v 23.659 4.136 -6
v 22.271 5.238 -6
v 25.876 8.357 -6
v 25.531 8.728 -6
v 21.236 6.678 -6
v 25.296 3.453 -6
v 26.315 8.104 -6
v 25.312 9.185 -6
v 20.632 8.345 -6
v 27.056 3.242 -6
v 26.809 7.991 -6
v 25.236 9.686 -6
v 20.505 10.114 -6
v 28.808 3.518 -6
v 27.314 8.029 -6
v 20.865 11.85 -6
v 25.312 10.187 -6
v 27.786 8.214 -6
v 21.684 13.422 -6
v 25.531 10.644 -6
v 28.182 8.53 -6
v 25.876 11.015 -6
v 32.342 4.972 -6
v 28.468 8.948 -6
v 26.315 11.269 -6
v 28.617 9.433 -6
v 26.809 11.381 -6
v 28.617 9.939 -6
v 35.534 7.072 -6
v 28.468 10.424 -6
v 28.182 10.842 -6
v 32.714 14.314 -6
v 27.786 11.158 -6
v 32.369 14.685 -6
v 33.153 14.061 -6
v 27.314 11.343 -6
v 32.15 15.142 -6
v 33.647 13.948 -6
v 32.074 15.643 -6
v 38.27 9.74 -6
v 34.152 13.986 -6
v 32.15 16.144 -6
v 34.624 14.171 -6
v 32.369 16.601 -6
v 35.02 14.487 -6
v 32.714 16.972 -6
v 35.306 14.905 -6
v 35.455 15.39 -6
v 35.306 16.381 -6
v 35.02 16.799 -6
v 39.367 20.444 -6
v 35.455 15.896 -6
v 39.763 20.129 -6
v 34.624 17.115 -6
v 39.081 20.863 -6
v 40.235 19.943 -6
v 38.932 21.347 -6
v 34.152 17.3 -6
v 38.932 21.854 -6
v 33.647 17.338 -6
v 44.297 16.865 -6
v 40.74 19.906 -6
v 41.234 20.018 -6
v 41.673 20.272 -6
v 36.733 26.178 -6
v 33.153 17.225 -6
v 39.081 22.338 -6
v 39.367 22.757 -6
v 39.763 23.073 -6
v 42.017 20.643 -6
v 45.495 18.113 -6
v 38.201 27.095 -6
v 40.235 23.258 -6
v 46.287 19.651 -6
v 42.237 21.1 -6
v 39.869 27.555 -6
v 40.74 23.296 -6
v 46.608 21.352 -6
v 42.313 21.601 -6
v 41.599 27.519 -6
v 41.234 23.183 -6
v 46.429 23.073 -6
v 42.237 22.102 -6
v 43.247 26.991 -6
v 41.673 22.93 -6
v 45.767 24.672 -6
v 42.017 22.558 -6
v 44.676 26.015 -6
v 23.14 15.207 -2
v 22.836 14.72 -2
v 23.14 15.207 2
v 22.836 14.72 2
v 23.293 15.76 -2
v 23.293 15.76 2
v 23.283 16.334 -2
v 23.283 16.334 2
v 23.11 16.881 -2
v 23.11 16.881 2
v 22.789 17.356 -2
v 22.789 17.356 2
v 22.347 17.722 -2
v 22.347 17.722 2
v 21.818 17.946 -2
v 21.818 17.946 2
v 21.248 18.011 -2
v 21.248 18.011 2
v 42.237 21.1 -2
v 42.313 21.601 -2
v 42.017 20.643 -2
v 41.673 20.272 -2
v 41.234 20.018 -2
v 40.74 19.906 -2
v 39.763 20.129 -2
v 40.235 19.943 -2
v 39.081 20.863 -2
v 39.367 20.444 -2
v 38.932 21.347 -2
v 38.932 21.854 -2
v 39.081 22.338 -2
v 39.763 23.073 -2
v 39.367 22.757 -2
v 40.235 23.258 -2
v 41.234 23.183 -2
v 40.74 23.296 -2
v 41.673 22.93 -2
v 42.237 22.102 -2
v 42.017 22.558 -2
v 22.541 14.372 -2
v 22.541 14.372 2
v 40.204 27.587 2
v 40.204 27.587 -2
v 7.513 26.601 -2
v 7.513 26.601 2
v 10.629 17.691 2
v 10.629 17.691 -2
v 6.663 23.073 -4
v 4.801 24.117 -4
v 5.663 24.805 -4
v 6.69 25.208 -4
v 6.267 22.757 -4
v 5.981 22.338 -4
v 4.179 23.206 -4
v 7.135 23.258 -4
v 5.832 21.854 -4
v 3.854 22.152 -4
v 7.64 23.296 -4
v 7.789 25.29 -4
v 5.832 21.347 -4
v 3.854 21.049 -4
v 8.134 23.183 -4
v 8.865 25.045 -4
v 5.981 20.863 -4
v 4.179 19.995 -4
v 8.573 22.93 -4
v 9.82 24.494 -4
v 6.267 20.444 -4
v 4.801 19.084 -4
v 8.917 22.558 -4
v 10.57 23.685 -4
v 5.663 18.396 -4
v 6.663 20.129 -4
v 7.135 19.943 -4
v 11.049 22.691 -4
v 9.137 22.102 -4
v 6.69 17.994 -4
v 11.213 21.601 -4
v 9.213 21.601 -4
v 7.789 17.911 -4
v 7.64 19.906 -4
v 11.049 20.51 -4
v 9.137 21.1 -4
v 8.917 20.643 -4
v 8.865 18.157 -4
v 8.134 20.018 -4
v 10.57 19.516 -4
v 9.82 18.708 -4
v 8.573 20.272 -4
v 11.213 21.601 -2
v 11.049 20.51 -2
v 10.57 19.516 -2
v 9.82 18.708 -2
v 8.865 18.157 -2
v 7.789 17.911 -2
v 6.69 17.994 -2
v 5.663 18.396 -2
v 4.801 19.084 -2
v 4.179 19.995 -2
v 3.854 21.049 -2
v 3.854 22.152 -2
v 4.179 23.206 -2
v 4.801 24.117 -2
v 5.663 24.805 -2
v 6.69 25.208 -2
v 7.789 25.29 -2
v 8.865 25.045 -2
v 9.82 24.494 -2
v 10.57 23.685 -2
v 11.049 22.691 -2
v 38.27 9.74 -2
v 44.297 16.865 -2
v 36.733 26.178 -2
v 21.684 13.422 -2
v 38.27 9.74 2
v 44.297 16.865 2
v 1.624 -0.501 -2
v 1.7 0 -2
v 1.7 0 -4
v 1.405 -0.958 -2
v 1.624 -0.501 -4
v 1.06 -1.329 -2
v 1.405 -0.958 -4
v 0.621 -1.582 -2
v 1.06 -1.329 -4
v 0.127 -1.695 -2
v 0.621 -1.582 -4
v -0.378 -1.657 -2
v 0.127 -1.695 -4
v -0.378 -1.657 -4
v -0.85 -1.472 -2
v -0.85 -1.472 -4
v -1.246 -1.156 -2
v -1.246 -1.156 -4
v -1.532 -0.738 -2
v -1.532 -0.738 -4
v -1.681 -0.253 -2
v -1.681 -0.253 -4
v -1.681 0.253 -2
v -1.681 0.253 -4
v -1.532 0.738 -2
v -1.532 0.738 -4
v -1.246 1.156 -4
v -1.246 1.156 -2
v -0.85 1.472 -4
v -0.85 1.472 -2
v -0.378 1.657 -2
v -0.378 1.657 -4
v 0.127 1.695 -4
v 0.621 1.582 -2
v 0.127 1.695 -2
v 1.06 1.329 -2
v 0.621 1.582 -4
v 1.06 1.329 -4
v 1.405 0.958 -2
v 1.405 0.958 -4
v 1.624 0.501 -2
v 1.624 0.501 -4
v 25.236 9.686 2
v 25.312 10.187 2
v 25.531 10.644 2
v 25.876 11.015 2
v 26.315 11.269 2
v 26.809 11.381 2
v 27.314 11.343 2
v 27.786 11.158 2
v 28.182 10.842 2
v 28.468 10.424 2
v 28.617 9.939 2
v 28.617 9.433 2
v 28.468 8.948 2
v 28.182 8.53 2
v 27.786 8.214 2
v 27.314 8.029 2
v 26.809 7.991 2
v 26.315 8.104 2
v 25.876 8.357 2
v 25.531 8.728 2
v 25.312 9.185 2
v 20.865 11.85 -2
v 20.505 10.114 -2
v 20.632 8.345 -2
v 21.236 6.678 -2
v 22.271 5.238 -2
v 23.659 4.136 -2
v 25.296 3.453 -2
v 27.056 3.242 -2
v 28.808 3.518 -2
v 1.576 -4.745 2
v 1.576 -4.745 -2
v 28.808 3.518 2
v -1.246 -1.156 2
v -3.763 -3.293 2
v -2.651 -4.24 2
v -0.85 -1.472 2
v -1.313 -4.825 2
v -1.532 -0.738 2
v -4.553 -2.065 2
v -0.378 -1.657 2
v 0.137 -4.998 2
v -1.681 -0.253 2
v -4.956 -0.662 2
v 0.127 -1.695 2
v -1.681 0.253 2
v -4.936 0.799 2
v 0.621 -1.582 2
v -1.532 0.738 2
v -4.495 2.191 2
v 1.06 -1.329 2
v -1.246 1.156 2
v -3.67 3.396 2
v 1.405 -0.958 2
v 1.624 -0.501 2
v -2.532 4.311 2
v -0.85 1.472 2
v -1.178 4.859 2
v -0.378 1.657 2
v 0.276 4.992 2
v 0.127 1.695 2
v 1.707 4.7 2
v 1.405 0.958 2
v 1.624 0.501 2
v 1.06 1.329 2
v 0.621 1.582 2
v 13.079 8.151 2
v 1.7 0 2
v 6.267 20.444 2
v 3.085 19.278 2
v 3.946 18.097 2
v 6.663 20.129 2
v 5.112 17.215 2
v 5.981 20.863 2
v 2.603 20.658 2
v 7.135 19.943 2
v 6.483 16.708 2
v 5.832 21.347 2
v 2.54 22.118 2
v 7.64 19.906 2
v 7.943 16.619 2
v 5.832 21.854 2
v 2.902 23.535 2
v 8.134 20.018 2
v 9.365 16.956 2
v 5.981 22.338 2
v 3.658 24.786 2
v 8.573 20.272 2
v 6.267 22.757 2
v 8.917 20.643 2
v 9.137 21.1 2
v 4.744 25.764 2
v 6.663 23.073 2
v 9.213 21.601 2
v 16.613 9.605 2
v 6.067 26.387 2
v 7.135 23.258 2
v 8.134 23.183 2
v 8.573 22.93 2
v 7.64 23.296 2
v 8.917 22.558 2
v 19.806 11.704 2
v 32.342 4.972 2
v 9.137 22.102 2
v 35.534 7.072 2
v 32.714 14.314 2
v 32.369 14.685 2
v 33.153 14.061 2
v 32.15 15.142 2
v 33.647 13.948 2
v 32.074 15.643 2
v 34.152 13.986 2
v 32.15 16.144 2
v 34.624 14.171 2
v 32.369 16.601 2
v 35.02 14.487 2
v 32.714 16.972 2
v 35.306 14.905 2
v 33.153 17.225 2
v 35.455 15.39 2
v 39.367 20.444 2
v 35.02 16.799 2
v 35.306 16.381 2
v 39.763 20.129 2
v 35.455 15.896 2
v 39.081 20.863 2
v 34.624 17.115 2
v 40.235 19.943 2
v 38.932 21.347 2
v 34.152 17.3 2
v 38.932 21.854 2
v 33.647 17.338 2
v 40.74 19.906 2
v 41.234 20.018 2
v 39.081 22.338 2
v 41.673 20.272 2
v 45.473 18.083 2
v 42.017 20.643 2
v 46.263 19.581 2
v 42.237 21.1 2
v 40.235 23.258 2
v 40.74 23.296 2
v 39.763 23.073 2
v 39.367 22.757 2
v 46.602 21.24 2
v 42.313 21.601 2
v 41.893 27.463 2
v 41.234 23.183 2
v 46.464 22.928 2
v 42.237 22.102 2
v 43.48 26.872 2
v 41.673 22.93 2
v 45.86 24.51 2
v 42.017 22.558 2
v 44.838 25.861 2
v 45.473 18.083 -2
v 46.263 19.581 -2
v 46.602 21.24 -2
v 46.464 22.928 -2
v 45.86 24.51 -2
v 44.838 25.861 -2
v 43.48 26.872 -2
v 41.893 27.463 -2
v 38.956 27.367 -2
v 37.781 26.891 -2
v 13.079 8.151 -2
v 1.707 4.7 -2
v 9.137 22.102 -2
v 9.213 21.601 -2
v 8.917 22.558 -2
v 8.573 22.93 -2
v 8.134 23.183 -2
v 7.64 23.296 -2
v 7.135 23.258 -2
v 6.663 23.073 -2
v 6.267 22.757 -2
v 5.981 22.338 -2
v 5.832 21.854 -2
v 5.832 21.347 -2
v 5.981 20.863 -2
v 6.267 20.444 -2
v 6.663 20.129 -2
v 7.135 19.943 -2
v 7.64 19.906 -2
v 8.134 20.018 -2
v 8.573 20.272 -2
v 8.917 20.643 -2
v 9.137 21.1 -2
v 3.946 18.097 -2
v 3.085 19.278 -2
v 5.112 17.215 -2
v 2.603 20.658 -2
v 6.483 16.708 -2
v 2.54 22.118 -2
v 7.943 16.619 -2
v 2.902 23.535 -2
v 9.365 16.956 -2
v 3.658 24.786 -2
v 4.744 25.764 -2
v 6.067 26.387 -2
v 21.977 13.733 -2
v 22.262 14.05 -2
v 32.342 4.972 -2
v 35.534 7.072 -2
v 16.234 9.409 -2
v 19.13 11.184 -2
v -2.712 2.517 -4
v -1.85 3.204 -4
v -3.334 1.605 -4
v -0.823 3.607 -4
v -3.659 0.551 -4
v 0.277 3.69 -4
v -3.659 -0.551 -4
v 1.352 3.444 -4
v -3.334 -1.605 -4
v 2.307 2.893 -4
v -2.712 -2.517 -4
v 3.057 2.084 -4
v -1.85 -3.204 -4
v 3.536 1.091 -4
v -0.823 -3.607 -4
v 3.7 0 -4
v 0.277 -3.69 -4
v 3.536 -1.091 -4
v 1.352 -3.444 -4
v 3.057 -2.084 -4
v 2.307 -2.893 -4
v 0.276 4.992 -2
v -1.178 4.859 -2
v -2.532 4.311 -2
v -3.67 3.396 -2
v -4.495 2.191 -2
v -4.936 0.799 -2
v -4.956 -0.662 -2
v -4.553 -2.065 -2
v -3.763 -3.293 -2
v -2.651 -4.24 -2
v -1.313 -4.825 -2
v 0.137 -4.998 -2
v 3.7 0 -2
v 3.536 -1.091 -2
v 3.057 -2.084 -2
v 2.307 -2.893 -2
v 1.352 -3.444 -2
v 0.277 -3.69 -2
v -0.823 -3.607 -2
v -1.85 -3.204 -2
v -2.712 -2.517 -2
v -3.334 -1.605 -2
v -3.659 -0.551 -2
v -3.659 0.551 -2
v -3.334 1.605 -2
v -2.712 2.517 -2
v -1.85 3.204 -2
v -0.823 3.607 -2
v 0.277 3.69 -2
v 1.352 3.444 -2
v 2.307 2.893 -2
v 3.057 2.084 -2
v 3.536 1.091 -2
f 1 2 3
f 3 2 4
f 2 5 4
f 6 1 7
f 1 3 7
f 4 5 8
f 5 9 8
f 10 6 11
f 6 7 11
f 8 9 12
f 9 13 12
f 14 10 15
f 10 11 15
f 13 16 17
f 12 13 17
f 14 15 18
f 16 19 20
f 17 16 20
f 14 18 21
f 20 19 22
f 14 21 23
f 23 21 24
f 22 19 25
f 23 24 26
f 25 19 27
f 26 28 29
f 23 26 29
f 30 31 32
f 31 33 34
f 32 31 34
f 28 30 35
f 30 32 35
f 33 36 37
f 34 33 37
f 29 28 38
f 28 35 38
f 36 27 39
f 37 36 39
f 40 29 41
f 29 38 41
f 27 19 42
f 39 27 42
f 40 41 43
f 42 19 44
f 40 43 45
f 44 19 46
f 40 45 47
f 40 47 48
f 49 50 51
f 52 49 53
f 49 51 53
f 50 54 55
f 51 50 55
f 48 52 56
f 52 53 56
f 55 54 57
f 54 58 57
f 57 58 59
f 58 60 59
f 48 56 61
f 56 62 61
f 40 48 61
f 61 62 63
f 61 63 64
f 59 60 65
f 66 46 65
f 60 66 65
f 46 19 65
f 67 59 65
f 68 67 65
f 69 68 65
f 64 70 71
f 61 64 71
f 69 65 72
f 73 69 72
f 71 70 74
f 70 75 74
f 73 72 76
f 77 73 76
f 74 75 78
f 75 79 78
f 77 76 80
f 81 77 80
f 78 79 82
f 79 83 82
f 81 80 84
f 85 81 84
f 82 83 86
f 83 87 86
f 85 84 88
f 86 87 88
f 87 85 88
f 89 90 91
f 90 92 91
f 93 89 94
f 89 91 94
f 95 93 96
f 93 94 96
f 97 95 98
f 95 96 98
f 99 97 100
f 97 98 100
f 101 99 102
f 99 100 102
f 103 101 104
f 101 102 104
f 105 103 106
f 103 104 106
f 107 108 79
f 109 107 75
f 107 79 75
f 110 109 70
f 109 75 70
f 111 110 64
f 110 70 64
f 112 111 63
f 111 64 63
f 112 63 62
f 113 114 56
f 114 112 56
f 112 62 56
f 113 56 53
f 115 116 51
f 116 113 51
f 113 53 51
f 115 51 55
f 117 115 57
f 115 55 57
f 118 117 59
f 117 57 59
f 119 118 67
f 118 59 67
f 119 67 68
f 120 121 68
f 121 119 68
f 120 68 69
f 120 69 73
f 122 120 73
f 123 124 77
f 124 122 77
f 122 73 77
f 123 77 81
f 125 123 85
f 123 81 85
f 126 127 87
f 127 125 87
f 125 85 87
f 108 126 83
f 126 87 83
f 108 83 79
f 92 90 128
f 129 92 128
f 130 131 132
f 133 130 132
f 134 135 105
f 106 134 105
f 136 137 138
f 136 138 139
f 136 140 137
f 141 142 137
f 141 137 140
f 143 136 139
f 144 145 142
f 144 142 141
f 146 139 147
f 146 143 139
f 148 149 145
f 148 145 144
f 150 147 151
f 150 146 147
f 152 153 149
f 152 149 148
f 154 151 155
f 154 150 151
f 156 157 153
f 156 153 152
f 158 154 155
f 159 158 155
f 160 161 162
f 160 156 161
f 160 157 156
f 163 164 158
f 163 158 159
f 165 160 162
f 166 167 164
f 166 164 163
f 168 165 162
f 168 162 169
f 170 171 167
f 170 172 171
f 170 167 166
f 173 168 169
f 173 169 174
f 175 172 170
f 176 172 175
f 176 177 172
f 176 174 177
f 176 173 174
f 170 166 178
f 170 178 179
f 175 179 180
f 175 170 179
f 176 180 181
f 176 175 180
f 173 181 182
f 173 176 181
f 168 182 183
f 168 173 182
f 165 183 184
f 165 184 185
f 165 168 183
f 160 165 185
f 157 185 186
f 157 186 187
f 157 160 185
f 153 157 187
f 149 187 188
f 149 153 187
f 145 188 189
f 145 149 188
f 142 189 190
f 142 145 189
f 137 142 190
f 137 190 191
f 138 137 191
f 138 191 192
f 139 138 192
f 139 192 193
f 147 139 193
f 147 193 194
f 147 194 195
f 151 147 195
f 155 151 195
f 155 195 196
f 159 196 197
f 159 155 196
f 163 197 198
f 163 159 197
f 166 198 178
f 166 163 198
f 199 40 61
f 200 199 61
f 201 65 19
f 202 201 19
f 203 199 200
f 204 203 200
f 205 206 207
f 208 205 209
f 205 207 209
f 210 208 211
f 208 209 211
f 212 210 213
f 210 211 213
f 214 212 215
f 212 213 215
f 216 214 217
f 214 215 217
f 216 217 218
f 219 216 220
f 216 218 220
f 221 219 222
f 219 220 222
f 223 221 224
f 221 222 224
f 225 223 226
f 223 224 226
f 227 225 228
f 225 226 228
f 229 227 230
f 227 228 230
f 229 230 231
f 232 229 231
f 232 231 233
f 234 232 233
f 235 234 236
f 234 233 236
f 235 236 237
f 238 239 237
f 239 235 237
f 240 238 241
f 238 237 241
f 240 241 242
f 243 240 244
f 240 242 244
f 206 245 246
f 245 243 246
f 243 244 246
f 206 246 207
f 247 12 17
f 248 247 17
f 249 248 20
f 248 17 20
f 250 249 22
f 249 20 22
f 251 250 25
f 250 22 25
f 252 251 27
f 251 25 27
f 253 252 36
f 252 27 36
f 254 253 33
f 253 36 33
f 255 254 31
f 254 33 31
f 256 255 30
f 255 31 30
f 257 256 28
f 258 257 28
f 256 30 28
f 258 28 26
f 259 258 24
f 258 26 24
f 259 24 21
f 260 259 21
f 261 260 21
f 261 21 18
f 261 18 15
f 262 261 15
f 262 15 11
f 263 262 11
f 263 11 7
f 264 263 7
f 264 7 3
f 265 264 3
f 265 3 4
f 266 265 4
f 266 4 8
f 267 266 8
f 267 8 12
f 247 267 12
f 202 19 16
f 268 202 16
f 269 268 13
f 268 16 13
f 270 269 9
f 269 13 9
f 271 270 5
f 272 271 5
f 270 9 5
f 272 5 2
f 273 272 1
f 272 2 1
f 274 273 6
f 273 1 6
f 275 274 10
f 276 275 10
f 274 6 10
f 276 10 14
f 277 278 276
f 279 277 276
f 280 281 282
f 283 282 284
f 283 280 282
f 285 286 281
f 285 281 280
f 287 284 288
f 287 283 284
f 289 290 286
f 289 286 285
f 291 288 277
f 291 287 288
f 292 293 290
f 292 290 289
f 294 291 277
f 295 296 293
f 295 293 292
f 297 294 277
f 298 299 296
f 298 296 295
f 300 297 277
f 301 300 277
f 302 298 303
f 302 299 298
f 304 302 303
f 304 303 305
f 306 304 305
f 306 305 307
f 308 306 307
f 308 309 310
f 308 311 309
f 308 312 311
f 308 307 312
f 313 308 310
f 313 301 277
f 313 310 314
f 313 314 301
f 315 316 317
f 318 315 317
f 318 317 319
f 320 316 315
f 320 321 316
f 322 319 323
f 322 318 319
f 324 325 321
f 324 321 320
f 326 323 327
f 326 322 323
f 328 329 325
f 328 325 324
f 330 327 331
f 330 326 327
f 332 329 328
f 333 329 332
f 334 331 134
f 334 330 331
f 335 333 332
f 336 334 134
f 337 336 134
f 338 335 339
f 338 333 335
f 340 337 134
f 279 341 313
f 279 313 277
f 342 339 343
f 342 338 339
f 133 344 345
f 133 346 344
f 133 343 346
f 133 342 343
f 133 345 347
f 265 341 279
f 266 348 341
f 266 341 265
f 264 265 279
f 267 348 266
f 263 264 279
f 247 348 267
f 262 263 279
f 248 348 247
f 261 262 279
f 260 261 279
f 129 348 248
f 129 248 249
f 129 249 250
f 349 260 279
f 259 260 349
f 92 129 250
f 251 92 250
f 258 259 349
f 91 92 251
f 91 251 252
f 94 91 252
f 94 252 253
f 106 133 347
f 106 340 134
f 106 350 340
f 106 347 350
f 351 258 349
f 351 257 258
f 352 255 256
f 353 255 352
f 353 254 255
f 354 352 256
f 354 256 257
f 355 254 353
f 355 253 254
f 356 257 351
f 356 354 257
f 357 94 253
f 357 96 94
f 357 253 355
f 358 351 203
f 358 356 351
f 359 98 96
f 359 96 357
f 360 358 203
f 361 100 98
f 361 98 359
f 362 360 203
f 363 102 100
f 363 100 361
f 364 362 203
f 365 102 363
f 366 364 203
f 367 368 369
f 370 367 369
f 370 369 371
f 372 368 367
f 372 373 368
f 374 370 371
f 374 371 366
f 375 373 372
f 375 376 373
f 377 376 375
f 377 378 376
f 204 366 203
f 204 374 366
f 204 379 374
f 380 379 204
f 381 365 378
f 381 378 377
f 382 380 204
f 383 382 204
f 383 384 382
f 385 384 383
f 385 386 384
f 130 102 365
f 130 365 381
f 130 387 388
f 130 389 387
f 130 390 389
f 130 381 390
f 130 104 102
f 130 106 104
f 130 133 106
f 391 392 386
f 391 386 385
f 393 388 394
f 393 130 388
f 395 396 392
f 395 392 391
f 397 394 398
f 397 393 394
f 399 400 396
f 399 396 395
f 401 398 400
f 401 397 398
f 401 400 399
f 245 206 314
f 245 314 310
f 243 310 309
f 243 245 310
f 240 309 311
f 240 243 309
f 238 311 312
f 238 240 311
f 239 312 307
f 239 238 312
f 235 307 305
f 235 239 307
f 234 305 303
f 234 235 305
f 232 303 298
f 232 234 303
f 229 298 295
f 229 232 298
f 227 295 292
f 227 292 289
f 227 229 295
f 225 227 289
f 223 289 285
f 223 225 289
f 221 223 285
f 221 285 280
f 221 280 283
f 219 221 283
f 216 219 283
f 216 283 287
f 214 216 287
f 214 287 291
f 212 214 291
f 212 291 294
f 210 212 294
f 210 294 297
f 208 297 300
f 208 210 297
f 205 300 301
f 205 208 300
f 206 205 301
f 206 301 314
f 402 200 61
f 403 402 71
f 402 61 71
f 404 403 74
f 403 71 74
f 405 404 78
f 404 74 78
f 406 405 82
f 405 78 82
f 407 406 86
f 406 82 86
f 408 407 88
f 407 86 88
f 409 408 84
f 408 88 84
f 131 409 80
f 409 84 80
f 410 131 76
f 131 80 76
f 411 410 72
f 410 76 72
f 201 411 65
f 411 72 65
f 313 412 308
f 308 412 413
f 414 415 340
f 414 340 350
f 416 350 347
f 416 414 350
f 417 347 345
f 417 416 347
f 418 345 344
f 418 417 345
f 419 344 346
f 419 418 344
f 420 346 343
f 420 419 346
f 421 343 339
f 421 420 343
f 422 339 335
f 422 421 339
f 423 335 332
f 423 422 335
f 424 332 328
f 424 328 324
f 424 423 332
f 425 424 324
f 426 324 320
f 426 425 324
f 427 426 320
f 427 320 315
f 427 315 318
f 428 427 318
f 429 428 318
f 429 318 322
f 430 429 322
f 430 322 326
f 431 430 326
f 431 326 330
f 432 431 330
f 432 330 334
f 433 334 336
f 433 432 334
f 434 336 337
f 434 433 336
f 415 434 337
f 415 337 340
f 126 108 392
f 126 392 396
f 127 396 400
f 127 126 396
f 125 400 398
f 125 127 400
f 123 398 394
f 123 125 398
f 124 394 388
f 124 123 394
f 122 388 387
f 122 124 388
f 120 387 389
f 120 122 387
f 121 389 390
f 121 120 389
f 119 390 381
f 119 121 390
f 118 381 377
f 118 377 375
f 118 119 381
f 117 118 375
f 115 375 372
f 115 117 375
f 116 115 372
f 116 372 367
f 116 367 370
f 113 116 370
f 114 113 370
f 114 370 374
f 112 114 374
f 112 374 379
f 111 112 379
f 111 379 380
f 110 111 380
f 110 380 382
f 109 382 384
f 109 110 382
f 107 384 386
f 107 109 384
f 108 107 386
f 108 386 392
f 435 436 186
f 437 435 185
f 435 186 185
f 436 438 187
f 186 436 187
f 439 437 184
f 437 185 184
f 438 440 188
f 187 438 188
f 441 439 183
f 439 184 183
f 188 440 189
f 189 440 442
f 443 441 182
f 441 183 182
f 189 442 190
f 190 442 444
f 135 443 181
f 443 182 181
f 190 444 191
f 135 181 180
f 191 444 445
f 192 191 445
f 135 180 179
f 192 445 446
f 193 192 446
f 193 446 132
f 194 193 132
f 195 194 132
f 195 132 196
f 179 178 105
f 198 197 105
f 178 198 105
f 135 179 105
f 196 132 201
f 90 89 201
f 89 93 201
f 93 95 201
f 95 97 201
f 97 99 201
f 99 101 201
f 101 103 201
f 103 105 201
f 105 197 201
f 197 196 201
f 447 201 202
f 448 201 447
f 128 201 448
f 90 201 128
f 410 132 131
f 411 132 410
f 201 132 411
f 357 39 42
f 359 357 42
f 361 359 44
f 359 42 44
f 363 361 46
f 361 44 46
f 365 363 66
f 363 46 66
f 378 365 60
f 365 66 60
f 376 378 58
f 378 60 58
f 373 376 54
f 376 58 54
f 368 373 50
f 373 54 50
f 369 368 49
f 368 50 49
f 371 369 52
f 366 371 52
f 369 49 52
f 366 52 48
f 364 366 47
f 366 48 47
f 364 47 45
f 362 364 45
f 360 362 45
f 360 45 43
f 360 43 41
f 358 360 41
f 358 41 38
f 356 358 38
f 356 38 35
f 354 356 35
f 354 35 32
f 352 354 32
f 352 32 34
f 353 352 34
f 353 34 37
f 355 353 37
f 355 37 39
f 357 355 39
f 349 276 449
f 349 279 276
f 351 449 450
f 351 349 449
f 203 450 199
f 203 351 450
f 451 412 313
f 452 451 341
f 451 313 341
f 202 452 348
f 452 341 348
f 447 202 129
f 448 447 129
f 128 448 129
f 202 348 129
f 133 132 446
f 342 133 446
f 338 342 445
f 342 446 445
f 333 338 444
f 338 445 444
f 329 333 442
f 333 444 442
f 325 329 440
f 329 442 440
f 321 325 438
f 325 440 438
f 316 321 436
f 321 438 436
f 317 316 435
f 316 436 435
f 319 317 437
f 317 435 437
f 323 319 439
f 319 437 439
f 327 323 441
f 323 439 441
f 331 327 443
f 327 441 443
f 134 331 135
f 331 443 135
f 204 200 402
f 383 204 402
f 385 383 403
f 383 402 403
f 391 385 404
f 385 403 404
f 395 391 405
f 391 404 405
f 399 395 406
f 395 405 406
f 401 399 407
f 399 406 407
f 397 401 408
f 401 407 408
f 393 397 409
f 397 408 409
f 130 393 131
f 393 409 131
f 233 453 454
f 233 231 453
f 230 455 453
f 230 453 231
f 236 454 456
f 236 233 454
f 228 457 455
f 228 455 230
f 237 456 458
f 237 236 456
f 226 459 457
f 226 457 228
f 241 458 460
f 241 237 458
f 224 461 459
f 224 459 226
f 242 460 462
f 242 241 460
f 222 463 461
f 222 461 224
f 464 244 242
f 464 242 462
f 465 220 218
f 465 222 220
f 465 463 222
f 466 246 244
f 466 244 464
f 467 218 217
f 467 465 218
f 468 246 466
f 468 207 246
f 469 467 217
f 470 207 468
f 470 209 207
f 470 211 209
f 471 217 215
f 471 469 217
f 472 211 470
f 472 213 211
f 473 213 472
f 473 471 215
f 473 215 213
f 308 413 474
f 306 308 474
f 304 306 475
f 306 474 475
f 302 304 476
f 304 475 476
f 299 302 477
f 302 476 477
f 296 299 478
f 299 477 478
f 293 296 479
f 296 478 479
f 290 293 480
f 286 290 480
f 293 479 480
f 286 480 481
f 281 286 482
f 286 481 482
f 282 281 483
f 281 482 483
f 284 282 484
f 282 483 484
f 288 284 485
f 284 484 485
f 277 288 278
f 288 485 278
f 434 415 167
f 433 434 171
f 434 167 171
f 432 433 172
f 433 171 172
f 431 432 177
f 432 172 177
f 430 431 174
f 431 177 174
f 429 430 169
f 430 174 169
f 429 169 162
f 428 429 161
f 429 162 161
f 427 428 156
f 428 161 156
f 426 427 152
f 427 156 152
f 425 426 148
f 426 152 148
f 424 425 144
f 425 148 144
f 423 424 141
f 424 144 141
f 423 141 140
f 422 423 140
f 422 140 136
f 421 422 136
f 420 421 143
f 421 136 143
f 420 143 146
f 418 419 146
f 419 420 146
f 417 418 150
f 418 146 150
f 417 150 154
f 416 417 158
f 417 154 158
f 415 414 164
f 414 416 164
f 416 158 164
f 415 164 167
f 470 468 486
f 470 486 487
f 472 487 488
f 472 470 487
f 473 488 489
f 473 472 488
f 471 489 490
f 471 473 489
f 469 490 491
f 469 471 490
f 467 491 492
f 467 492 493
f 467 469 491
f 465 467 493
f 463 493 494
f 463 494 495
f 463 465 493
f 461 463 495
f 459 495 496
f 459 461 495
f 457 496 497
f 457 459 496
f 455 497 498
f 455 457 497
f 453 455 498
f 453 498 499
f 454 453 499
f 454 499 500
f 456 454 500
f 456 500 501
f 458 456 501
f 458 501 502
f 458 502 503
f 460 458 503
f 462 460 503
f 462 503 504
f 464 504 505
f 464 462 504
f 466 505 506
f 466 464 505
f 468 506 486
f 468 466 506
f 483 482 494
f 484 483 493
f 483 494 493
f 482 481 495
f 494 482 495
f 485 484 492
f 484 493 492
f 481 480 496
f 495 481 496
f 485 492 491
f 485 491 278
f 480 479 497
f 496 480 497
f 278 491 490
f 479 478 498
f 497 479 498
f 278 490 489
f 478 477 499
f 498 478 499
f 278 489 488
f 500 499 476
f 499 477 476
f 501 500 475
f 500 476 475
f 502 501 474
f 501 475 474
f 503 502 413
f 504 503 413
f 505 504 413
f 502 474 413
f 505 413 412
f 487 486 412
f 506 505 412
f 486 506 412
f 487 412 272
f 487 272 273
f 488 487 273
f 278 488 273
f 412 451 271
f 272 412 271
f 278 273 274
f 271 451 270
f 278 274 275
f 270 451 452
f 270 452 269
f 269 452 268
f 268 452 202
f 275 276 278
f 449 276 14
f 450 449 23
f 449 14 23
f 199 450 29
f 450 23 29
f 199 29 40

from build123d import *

# Parameters (mm, degrees)
BOSS_EXTRUDE1_DEPTH      = 2
BOSS_EXTRUDE1_DEPTH_BACK = 2
SKETCH2_R                = 1.7
FILLET1_R                = 20
BOSS_EXTRUDE4_START      = 4
SKETCH7_R                = 1.7
BOSS_EXTRUDE4_DEPTH      = 4
BOSS_EXTRUDE5_START      = 2
SKETCH8_R                = 3.7
SKETCH8_R_2              = 1.7
BOSS_EXTRUDE5_DEPTH      = 2
FILLET4_R                = 2
SKETCH9_R                = 1.7
CUT_EXTRUDE1_DEPTH       = 55.759144692


with BuildPart() as part:
    # Sketch2 → Boss-Extrude1 (new, two sides: drawn at the far end of the back side and taken through both)
    with BuildSketch(Plane.XY.offset(-BOSS_EXTRUDE1_DEPTH_BACK)):
        with BuildLine():
            Line((1.575752274, -4.745208612), (34.456924853, 5.232629629))
            Line((34.456924853, 5.232629629), (44.296635241, 16.864742156))
            ThreePointArc((44.296635241, 16.864742156), (46.218376178, 23.740514028), (40.203783054, 27.586810508))
            Line((40.203783054, 27.586810508), (7.512886707, 26.600773906))
            ThreePointArc((7.512886707, 26.600773906), (2.79322071, 19.950091357), (10.629154827, 17.690675057))
            Line((10.629154827, 17.690675057), (25.733767379, 18.146266751))
            Line((25.733767379, 18.146266751), (18.728666276, 9.86511608))
            Line((18.728666276, 9.86511608), (1.70658462, 4.699741369))
            ThreePointArc((1.70658462, 4.699741369), (-4.999520368, 0.069253832), (1.575752274, -4.745208612))
        make_face()
        Circle(SKETCH2_R, mode=Mode.SUBTRACT)
        with Locations((40.612886707, 21.600773906)):
            Circle(SKETCH2_R, mode=Mode.SUBTRACT)
        with Locations((7.512886707, 21.600773906)):
            Circle(SKETCH2_R, mode=Mode.SUBTRACT)
    extrude(amount=BOSS_EXTRUDE1_DEPTH + BOSS_EXTRUDE1_DEPTH_BACK)

    # Fillet1
    fillet1_edges = [part.edges().sort_by_distance(p)[0] for p in [
        (34.456924853, 5.232629629, 0),
        (18.728666276, 9.86511608, 0),
    ]]
    fillet(fillet1_edges, radius=FILLET1_R)

    # Sketch7 → Boss-Extrude4 (add)
    with BuildSketch(Plane(origin=(0, 0, -2), x_dir=(-1, 0, 0), z_dir=(0, 0, -1)).offset(BOSS_EXTRUDE4_START)):
        with BuildLine():
            Line((-36.733417778, 26.177860406), (-21.683989193, 13.422192867))
            ThreePointArc((-21.683989193, 13.422192867), (-21.70362245, 5.922427438), (-28.807655282, 3.518350802))
            ThreePointArc((-28.807655282, 3.518350802), (-33.988212002, 5.945467438), (-38.269694349, 9.739933408))
            Line((-38.269694349, 9.739933408), (-44.296635241, 16.864742156))
            ThreePointArc((-44.296635241, 16.864742156), (-45.270474012, 25.383217626), (-36.733417778, 26.177860406))
        make_face()
        with Locations(Location((-40.612886707, 21.600773906, 0), (0, 0, 180))):
            Circle(SKETCH7_R, mode=Mode.SUBTRACT)
    extrude(amount=-BOSS_EXTRUDE4_DEPTH)

    # Sketch8 → Boss-Extrude5 (add)
    # profile 1 of 2: a face of its own
    with BuildSketch(Plane(origin=(0, 0, -2), x_dir=(-1, 0, 0), z_dir=(0, 0, -1)).offset(BOSS_EXTRUDE5_START)):
        with Locations(Location((-7.512886707, 21.600773906, 0), (0, 0, 180))):
            Circle(SKETCH8_R)
        with Locations(Location((-7.512886707, 21.600773906, 0), (0, 0, 180))):
            Circle(SKETCH8_R_2, mode=Mode.SUBTRACT)
    # profile 2 of 2: a face of its own
    with BuildSketch(Plane(origin=(0, 0, -2), x_dir=(-1, 0, 0), z_dir=(0, 0, -1)).offset(BOSS_EXTRUDE5_START)):
        with Locations(Location((0, 0, 0), (0, 0, 180))):
            Circle(SKETCH8_R)
        with Locations(Location((0, 0, 0), (0, 0, 180))):
            Circle(SKETCH8_R_2, mode=Mode.SUBTRACT)
    extrude(amount=-BOSS_EXTRUDE5_DEPTH)

    # Fillet4
    fillet4_edges = [part.edges().sort_by_distance(p)[0] for p in [
        (25.733767379, 18.146266751, 0),
    ]]
    fillet(fillet4_edges, radius=FILLET4_R)

    # Sketch9 → Cut-Extrude1 (cut, through all)
    with BuildSketch(Plane(origin=(0, 0, -6), x_dir=(-1, 0, 0), z_dir=(0, 0, -1))):
        with Locations((-33.774027465, 15.643013901)):
            Circle(SKETCH9_R)
        with Locations((-26.936063231, 9.686033593)):
            Circle(SKETCH9_R)
    extrude(amount=-CUT_EXTRUDE1_DEPTH, mode=Mode.SUBTRACT)


solid = part.part
